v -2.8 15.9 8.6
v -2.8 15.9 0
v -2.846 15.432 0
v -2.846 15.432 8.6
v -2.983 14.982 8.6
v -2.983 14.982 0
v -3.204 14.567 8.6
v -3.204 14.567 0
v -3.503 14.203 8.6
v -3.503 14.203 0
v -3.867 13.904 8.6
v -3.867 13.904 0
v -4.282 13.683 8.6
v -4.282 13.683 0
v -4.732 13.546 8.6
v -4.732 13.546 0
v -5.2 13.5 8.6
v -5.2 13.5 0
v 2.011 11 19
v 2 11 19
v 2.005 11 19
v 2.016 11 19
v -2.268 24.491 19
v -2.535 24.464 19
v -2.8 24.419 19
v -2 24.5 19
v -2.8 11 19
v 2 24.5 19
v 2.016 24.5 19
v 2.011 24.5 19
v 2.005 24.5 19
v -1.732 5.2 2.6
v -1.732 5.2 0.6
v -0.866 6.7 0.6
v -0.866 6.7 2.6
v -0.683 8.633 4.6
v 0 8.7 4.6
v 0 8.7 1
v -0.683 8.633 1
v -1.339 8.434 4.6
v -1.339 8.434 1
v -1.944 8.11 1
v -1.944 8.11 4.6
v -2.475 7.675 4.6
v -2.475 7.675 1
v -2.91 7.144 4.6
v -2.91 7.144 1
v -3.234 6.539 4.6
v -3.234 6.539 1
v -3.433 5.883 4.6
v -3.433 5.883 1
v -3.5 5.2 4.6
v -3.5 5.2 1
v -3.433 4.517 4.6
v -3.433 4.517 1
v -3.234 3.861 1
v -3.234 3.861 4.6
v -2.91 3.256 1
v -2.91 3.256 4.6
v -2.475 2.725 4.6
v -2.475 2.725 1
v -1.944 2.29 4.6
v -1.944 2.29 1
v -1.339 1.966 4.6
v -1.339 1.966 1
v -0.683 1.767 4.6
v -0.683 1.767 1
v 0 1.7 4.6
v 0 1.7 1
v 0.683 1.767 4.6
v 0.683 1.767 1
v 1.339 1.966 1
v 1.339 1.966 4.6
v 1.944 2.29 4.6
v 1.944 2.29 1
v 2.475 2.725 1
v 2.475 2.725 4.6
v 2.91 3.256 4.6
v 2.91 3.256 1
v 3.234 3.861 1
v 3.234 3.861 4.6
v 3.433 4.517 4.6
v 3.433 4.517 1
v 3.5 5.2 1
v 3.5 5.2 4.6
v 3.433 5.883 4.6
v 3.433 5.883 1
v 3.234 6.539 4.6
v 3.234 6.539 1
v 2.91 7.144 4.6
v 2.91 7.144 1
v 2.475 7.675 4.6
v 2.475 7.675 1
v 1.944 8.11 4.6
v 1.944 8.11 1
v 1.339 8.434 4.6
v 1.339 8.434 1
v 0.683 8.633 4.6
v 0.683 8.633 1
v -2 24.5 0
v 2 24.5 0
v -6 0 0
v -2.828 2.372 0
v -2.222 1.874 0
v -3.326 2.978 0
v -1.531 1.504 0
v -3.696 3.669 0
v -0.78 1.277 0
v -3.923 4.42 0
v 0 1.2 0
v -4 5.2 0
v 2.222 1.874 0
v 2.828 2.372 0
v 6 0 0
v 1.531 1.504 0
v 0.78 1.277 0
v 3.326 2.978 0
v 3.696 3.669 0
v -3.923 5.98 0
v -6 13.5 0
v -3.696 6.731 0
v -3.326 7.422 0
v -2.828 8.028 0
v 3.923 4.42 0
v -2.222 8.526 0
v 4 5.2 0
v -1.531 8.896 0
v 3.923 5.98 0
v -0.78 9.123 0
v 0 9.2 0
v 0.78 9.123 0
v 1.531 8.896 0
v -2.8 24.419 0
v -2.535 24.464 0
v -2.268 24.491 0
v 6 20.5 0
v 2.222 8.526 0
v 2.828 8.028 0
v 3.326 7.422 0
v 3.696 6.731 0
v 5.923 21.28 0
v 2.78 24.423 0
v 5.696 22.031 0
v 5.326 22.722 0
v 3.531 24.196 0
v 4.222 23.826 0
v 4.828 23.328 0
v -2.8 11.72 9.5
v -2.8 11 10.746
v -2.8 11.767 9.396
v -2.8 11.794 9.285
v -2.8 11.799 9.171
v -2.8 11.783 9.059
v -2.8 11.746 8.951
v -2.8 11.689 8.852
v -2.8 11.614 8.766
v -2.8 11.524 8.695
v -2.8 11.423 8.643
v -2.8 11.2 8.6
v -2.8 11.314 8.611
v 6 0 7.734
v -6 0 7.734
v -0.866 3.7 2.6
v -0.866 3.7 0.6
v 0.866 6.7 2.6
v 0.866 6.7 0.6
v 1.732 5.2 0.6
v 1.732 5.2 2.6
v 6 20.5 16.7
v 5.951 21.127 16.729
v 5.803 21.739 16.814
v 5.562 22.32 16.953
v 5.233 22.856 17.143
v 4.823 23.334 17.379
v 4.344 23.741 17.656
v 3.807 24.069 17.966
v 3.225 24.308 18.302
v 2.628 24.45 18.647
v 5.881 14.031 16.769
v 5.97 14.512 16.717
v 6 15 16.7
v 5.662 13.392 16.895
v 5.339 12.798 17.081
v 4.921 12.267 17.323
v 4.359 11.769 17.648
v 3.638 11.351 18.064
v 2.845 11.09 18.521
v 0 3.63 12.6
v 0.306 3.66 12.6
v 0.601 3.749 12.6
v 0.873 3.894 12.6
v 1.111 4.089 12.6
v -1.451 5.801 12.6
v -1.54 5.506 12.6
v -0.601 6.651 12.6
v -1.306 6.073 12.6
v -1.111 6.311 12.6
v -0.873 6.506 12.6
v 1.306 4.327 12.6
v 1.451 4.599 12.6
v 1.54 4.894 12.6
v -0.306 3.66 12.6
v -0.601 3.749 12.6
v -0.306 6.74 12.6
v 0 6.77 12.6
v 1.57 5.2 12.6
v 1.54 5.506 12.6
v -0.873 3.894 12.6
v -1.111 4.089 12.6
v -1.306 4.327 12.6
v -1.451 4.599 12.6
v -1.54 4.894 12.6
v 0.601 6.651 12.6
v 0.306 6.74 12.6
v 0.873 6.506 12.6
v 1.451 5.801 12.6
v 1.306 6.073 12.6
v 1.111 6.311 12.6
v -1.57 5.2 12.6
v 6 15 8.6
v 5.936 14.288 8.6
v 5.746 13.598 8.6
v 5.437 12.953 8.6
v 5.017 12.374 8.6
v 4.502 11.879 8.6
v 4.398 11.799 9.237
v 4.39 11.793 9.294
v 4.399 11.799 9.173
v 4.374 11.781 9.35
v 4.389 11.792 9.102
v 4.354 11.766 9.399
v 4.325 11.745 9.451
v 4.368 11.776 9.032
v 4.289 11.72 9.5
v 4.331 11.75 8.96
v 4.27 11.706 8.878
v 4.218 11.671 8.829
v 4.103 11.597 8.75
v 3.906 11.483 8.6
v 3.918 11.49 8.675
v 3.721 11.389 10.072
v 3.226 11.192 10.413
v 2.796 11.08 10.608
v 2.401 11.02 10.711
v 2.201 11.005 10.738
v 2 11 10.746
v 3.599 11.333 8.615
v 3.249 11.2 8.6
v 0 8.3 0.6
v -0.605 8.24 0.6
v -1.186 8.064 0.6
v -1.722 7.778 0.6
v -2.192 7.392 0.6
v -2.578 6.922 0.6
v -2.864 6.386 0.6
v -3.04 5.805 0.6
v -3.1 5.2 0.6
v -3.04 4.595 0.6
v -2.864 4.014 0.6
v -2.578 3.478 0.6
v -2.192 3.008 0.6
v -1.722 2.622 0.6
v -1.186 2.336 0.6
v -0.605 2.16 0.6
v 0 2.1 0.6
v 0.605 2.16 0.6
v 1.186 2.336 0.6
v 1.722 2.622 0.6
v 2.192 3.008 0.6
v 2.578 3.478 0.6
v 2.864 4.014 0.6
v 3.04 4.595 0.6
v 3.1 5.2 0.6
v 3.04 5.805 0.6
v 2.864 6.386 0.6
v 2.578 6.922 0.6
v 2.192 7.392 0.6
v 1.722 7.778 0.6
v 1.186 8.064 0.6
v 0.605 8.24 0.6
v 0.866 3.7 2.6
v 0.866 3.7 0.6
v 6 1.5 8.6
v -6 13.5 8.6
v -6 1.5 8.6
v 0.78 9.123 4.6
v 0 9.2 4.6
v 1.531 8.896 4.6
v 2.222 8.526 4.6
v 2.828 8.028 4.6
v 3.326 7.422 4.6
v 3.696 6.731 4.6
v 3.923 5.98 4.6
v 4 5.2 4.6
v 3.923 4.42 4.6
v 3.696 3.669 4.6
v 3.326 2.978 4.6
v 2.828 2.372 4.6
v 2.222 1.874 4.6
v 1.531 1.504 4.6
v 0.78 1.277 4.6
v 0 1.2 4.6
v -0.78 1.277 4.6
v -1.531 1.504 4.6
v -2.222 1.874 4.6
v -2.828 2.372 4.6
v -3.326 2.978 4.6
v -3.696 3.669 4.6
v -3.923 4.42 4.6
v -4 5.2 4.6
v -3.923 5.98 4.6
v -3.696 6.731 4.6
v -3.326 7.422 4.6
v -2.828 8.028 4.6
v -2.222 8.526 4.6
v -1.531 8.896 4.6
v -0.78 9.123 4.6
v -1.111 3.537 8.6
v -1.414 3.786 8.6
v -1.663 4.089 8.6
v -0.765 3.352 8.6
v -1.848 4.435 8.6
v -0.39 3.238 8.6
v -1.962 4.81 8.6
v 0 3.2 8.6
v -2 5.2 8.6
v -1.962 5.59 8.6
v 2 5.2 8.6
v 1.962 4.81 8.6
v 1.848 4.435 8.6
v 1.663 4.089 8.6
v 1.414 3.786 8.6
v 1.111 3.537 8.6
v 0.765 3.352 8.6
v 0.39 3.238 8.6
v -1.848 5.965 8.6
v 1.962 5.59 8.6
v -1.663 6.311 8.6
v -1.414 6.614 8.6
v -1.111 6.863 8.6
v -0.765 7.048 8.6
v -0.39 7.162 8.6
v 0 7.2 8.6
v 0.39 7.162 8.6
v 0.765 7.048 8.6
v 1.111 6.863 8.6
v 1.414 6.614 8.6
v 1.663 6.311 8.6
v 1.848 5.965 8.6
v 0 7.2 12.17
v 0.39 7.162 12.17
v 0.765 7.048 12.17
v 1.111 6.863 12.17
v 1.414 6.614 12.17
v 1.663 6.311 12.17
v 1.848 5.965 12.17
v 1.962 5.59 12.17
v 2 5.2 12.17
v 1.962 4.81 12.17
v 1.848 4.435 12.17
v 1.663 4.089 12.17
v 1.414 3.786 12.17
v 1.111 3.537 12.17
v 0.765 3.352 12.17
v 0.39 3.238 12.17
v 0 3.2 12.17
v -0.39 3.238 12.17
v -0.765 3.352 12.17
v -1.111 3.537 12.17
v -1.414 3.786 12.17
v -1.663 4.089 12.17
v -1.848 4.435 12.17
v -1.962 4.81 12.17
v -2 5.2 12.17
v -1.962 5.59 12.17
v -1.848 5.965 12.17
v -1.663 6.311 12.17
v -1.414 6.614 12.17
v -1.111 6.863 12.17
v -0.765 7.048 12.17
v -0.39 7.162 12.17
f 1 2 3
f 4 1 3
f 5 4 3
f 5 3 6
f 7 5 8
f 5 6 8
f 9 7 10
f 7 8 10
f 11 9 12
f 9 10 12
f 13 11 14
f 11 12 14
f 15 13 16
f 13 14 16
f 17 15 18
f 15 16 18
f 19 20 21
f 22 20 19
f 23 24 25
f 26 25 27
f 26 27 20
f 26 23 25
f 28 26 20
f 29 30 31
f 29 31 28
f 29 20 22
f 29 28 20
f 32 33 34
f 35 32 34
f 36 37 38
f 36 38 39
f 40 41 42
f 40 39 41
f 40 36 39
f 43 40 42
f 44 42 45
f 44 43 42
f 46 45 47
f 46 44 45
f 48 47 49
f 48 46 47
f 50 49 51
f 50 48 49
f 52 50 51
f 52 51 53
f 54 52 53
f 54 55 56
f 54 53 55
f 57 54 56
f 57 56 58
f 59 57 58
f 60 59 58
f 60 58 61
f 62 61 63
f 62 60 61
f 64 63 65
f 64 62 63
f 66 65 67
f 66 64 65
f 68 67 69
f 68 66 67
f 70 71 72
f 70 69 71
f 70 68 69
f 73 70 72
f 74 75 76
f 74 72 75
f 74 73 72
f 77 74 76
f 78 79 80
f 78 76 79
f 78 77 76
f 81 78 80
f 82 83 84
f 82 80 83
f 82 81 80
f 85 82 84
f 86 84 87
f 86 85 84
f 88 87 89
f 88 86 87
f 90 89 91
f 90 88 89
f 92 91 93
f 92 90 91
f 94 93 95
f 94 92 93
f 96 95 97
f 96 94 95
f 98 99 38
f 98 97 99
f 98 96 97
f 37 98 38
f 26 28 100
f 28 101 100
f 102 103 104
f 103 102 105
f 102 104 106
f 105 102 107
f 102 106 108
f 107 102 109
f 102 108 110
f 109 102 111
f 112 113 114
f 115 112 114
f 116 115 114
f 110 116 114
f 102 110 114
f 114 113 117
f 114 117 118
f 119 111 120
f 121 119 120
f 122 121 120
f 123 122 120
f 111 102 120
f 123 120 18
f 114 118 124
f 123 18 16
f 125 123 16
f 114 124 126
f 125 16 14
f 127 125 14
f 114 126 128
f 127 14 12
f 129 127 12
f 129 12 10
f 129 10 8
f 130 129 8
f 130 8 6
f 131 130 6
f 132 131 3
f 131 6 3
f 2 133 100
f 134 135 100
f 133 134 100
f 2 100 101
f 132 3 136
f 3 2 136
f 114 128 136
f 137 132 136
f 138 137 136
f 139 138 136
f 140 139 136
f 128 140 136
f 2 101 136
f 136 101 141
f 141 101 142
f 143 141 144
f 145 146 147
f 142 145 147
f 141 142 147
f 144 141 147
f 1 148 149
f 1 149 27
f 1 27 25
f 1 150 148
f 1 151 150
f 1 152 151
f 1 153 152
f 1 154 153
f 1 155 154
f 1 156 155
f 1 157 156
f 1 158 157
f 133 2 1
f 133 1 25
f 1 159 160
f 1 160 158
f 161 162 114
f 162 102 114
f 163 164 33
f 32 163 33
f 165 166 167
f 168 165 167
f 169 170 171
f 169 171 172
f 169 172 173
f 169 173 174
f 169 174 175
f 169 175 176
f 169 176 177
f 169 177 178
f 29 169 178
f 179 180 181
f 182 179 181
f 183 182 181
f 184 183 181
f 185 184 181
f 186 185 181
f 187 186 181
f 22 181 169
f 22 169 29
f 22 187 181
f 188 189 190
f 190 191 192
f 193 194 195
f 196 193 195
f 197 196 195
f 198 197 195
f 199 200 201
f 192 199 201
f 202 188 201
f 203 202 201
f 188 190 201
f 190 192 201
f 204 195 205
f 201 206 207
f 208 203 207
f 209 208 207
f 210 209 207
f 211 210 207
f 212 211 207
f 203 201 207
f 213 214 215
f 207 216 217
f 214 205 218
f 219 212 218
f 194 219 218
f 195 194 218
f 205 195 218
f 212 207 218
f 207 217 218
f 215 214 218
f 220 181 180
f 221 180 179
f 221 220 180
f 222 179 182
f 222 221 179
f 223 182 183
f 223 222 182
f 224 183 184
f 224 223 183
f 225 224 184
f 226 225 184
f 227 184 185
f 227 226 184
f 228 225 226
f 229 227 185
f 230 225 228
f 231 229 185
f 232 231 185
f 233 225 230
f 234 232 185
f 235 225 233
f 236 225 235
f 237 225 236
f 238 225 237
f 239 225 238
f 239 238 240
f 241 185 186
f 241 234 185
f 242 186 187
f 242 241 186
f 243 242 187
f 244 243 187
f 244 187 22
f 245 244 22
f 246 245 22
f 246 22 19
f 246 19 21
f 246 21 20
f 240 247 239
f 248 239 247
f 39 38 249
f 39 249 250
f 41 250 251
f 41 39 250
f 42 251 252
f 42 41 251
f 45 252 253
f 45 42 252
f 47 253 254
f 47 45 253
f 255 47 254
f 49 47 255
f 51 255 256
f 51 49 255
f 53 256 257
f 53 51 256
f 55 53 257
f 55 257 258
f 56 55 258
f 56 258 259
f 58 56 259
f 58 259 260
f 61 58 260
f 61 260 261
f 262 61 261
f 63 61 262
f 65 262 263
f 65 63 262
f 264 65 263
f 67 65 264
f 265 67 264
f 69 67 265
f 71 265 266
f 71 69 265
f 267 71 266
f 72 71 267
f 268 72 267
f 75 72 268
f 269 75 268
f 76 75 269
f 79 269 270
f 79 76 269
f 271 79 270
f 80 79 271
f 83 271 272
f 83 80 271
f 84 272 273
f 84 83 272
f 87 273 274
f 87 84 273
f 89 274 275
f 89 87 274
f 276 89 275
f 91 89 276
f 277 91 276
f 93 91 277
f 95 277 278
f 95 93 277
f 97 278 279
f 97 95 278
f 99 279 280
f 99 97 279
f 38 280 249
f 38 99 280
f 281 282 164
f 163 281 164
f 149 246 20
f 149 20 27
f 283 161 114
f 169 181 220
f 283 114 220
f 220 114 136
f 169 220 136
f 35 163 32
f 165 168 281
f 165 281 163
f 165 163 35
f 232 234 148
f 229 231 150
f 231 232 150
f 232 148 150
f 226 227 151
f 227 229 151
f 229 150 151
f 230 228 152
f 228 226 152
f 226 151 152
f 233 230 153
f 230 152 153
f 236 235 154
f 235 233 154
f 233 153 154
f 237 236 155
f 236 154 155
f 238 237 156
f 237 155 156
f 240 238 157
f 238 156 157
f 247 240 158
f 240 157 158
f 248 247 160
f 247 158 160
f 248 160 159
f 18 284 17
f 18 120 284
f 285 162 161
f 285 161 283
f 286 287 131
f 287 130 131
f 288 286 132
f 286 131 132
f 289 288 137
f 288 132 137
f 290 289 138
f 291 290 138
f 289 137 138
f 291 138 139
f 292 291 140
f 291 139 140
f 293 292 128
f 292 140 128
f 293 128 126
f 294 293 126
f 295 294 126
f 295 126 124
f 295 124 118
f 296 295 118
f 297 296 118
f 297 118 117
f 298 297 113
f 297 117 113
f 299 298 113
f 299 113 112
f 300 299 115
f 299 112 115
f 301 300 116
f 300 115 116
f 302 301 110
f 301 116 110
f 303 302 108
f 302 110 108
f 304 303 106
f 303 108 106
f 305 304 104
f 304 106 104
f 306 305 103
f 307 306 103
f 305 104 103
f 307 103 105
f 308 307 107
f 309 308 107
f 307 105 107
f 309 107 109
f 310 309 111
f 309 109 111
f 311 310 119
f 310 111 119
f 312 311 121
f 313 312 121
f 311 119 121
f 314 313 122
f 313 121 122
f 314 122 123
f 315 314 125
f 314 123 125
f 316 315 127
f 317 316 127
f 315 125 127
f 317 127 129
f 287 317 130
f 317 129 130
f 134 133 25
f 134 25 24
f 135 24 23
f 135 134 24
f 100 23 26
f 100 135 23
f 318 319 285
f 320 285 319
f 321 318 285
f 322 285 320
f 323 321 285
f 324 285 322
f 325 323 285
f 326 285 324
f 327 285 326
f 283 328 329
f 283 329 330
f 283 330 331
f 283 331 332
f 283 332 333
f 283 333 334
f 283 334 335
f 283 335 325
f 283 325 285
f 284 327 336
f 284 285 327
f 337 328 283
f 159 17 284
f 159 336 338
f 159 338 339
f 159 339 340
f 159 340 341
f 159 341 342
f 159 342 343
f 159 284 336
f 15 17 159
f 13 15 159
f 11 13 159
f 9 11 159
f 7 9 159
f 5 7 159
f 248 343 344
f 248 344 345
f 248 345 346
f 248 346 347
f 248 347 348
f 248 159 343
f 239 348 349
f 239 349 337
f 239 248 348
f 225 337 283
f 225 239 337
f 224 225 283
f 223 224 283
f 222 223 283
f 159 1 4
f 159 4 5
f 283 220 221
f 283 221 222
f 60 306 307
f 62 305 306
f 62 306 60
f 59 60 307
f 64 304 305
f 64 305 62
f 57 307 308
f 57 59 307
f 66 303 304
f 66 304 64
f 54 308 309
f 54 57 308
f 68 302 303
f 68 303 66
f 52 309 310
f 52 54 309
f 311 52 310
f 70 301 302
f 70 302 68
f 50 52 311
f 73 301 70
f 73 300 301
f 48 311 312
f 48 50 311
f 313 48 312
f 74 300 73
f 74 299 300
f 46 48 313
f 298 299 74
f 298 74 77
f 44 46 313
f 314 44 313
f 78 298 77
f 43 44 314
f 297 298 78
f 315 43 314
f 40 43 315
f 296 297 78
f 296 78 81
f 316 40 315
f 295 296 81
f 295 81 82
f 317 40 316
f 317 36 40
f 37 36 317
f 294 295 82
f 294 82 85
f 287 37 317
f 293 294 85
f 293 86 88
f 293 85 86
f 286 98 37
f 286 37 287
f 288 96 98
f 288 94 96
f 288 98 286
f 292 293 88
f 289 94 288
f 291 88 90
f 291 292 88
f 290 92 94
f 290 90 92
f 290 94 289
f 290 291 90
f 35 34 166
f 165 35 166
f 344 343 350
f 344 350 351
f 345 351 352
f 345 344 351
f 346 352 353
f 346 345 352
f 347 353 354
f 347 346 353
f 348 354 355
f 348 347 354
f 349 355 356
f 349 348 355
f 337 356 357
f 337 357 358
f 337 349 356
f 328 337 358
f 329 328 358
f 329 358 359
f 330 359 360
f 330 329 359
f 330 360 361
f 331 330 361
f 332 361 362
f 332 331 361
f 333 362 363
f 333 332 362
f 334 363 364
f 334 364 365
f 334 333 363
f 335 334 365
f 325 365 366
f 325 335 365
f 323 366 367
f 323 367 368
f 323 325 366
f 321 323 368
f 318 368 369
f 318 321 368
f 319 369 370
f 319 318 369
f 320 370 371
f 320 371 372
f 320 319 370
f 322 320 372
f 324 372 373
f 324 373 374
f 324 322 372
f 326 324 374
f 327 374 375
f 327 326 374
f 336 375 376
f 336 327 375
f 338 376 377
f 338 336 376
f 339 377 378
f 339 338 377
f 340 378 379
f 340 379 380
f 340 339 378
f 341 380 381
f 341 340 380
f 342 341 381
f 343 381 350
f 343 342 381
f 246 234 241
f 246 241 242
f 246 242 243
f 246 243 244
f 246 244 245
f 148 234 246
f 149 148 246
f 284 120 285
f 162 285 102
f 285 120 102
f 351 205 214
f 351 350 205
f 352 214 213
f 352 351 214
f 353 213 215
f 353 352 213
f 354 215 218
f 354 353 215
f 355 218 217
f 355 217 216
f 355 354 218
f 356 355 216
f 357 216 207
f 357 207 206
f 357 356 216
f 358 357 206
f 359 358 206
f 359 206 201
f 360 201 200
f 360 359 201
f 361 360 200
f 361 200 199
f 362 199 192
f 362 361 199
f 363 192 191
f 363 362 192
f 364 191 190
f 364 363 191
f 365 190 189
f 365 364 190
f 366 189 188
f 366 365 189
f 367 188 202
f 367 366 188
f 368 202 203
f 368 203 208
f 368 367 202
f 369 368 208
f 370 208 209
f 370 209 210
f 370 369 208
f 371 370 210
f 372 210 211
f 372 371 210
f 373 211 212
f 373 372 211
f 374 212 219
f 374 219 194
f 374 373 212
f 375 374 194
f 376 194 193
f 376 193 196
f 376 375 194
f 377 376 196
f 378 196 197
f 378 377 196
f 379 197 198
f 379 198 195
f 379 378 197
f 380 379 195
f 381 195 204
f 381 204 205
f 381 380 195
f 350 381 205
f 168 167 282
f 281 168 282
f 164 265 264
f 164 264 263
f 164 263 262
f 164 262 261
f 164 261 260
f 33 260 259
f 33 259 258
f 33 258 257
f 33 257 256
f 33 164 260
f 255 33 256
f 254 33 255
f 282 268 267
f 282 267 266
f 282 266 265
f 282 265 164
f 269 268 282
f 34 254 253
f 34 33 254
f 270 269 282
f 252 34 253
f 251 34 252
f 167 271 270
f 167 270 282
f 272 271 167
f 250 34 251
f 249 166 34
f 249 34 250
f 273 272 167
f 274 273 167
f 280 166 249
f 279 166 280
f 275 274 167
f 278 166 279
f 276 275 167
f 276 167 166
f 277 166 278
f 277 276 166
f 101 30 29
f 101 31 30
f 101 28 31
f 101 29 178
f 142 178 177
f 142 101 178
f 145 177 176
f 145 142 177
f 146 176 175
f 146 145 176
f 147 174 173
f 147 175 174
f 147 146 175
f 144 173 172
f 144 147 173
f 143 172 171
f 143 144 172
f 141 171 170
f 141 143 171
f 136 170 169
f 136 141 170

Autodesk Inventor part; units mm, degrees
sketch "Skizze_1" plane through (0, 0, 0) normal (0, 0, 1) x (1, 0, 0)
  line L0 (-6, 20.5) -> (-6, 0)
  line L1 (-6, 0) -> (6, 0)
  line L2 (6, 0) -> (6, 20.5)
  arc A0 (6, 20.5) -> (2, 24.5) centre (2, 20.5) ccw
  line L3 (2, 24.5) -> (-2, 24.5)
  arc A1 (-2, 24.5) -> (-6, 20.5) centre (-2, 20.5) ccw
extrude "Extrusion1" add sketch "Skizze_1" along normal blind 19
sketch "Skizze_2" plane through (0, 0, 0) normal (1, 0, 0) x (0, 1, 0)
  line L0 (1.5, 8.6) -> (0, 8.6)
  line L1 (0, 8.6) -> (0, 7.734)
  line L2 (0, 7.734) -> (1.5, 8.6)
extrude "Extrusion2" cut sketch "Skizze_2" along normal mid plane 12
sketch "Skizze_5" plane through (0, 0, 0) normal (1, 0, 0) x (0, 1, 0)
  line L0 (5.2, 0) -> (5.2, 8.6)
  line L1 (5.2, 0.6) -> (8.3, 0.6)
  line L2 (8.3, 0.6) -> (8.7, 1)
  line L3 (8.7, 1) -> (8.7, 4.6)
  line L4 (8.7, 4.6) -> (9.2, 4.6)
  line L5 (9.2, 4.6) -> (9.2, 0)
  line L6 (9.2, 0) -> (5.2, 0)
  line L7 (5.2, 0) -> (5.2, 0.6)
sketch "Sketch_1" plane through (0, 0, 8.6) normal (0, 0, 1) x (1, 0, 0)
  line L0 (-6, 24.5) -> (-6, 0)
  line L1 (-6, 0) -> (8, 0)
  line L2 (8, 0) -> (8, 15)
  line L3 (8, 15) -> (6, 15)
  arc A0 (2, 11) -> (6, 15) centre (2, 15) ccw
  line L4 (2, 11) -> (-2.8, 11)
  line L5 (-2.8, 11) -> (-2.8, 24.5)
  line L6 (-2.8, 24.5) -> (-6, 24.5)
extrude "Extrusion3" cut sketch "Sketch_1" along normal blind 19.8
revolve "Revolution1" cut sketch "Skizze_5" angle 360 about axis through (0, 5.2, 0) along (0, 0, -1)
sketch "Skizze_6" plane through (0, 5.2, 0.6) normal (0, 0, -1) x (0, 1, 0)
  line L0 (-1.5, -0.866) -> (0, -1.7321)
  line L1 (0, -1.7321) -> (1.5, -0.866)
  line L2 (1.5, -0.866) -> (1.5, 0.866)
  line L3 (1.5, 0.866) -> (0, 1.7321)
  line L4 (0, 1.7321) -> (-1.5, 0.866)
  line L5 (-1.5, 0.866) -> (-1.5, -0.866)
extrude "Extrusion4" cut sketch "Skizze_6" against normal blind 2
sketch "Skizze_9" plane through (0, 0, 6.45) normal (0, 0, 1) x (1, 0, 0)
  line L0 (-6, 13.5) -> (-5.2, 13.5)
  arc A0 (-5.2, 13.5) -> (-2.8, 15.9) centre (-5.2, 15.9) ccw
  line L1 (-2.8, 15.9) -> (-2.8, 24.5)
  line L2 (-2.8, 24.5) -> (-6, 24.5)
  line L3 (-6, 24.5) -> (-6, 13.5)
extrude "Extrusion5" cut sketch "Skizze_9" along normal mid plane 12.9
sketch "Skizze_13" plane through (0, 0, 0) normal (1, 0, 0) x (0, 1, 0)
  line L0 (10.9, 10.9196) -> (10.9, 8.6)
  line L1 (10.9, 8.6) -> (11.2, 8.6)
  arc A0 (11.2, 8.6) -> (11.7196, 9.5) centre (11.2, 9.2) ccw
  line L2 (11.7196, 9.5) -> (10.9, 10.9196)
extrude "Extrusion6" cut sketch "Skizze_13" along normal mid plane 12
sketch "Sketch_3" plane through (0, 0, 0) normal (0, 1, 0) x (-1, 0, 0)
  line L0 (-2.0163, 19) -> (-6, 19)
  line L1 (-6, 19) -> (-6, 16.7)
  line L2 (-6, 16.7) -> (-2.0163, 19)
extrude "Extrusion7" cut sketch "Sketch_3" along normal mid plane 49
sketch "Sketch_5" plane through (0, 0, 0) normal (1, 0, 0) x (0, 1, 0)
  line L0 (5.2, 8.6) -> (5.2, 12.6)
  line L1 (5.2, 12.6) -> (6.7705, 12.6)
  line L2 (6.7705, 12.6) -> (7.2, 12.1705)
  line L3 (7.2, 12.1705) -> (7.2, 8.6)
  line L4 (7.2, 8.6) -> (5.2, 8.6)
  line L5 (5.2, 8.6) -> (5.2, 12.6)
revolve "Revolution2" add sketch "Sketch_5" angle 360 about axis through (0, 5.2, 8.6) along (0, 0, -1)
thread "Thread1" size "M4x0.7" class "6g" standard "ISO Metric profile" full length
ref_plane "ANBAU_XY" through (0, 5.2, 8.6) normal (0, 0, -1) x (1, 0, 0)
ref_plane "ANBAU_YZ" through (0, 5.2, 8.6) normal (1, 0, 0) x (0, -1, 0)
ref_plane "ANBAU_ZX" through (0, 5.2, 8.6) normal (0, -1, 0) x (0, 0, -1)
properties part number "686786 DGSL-12-AS"
